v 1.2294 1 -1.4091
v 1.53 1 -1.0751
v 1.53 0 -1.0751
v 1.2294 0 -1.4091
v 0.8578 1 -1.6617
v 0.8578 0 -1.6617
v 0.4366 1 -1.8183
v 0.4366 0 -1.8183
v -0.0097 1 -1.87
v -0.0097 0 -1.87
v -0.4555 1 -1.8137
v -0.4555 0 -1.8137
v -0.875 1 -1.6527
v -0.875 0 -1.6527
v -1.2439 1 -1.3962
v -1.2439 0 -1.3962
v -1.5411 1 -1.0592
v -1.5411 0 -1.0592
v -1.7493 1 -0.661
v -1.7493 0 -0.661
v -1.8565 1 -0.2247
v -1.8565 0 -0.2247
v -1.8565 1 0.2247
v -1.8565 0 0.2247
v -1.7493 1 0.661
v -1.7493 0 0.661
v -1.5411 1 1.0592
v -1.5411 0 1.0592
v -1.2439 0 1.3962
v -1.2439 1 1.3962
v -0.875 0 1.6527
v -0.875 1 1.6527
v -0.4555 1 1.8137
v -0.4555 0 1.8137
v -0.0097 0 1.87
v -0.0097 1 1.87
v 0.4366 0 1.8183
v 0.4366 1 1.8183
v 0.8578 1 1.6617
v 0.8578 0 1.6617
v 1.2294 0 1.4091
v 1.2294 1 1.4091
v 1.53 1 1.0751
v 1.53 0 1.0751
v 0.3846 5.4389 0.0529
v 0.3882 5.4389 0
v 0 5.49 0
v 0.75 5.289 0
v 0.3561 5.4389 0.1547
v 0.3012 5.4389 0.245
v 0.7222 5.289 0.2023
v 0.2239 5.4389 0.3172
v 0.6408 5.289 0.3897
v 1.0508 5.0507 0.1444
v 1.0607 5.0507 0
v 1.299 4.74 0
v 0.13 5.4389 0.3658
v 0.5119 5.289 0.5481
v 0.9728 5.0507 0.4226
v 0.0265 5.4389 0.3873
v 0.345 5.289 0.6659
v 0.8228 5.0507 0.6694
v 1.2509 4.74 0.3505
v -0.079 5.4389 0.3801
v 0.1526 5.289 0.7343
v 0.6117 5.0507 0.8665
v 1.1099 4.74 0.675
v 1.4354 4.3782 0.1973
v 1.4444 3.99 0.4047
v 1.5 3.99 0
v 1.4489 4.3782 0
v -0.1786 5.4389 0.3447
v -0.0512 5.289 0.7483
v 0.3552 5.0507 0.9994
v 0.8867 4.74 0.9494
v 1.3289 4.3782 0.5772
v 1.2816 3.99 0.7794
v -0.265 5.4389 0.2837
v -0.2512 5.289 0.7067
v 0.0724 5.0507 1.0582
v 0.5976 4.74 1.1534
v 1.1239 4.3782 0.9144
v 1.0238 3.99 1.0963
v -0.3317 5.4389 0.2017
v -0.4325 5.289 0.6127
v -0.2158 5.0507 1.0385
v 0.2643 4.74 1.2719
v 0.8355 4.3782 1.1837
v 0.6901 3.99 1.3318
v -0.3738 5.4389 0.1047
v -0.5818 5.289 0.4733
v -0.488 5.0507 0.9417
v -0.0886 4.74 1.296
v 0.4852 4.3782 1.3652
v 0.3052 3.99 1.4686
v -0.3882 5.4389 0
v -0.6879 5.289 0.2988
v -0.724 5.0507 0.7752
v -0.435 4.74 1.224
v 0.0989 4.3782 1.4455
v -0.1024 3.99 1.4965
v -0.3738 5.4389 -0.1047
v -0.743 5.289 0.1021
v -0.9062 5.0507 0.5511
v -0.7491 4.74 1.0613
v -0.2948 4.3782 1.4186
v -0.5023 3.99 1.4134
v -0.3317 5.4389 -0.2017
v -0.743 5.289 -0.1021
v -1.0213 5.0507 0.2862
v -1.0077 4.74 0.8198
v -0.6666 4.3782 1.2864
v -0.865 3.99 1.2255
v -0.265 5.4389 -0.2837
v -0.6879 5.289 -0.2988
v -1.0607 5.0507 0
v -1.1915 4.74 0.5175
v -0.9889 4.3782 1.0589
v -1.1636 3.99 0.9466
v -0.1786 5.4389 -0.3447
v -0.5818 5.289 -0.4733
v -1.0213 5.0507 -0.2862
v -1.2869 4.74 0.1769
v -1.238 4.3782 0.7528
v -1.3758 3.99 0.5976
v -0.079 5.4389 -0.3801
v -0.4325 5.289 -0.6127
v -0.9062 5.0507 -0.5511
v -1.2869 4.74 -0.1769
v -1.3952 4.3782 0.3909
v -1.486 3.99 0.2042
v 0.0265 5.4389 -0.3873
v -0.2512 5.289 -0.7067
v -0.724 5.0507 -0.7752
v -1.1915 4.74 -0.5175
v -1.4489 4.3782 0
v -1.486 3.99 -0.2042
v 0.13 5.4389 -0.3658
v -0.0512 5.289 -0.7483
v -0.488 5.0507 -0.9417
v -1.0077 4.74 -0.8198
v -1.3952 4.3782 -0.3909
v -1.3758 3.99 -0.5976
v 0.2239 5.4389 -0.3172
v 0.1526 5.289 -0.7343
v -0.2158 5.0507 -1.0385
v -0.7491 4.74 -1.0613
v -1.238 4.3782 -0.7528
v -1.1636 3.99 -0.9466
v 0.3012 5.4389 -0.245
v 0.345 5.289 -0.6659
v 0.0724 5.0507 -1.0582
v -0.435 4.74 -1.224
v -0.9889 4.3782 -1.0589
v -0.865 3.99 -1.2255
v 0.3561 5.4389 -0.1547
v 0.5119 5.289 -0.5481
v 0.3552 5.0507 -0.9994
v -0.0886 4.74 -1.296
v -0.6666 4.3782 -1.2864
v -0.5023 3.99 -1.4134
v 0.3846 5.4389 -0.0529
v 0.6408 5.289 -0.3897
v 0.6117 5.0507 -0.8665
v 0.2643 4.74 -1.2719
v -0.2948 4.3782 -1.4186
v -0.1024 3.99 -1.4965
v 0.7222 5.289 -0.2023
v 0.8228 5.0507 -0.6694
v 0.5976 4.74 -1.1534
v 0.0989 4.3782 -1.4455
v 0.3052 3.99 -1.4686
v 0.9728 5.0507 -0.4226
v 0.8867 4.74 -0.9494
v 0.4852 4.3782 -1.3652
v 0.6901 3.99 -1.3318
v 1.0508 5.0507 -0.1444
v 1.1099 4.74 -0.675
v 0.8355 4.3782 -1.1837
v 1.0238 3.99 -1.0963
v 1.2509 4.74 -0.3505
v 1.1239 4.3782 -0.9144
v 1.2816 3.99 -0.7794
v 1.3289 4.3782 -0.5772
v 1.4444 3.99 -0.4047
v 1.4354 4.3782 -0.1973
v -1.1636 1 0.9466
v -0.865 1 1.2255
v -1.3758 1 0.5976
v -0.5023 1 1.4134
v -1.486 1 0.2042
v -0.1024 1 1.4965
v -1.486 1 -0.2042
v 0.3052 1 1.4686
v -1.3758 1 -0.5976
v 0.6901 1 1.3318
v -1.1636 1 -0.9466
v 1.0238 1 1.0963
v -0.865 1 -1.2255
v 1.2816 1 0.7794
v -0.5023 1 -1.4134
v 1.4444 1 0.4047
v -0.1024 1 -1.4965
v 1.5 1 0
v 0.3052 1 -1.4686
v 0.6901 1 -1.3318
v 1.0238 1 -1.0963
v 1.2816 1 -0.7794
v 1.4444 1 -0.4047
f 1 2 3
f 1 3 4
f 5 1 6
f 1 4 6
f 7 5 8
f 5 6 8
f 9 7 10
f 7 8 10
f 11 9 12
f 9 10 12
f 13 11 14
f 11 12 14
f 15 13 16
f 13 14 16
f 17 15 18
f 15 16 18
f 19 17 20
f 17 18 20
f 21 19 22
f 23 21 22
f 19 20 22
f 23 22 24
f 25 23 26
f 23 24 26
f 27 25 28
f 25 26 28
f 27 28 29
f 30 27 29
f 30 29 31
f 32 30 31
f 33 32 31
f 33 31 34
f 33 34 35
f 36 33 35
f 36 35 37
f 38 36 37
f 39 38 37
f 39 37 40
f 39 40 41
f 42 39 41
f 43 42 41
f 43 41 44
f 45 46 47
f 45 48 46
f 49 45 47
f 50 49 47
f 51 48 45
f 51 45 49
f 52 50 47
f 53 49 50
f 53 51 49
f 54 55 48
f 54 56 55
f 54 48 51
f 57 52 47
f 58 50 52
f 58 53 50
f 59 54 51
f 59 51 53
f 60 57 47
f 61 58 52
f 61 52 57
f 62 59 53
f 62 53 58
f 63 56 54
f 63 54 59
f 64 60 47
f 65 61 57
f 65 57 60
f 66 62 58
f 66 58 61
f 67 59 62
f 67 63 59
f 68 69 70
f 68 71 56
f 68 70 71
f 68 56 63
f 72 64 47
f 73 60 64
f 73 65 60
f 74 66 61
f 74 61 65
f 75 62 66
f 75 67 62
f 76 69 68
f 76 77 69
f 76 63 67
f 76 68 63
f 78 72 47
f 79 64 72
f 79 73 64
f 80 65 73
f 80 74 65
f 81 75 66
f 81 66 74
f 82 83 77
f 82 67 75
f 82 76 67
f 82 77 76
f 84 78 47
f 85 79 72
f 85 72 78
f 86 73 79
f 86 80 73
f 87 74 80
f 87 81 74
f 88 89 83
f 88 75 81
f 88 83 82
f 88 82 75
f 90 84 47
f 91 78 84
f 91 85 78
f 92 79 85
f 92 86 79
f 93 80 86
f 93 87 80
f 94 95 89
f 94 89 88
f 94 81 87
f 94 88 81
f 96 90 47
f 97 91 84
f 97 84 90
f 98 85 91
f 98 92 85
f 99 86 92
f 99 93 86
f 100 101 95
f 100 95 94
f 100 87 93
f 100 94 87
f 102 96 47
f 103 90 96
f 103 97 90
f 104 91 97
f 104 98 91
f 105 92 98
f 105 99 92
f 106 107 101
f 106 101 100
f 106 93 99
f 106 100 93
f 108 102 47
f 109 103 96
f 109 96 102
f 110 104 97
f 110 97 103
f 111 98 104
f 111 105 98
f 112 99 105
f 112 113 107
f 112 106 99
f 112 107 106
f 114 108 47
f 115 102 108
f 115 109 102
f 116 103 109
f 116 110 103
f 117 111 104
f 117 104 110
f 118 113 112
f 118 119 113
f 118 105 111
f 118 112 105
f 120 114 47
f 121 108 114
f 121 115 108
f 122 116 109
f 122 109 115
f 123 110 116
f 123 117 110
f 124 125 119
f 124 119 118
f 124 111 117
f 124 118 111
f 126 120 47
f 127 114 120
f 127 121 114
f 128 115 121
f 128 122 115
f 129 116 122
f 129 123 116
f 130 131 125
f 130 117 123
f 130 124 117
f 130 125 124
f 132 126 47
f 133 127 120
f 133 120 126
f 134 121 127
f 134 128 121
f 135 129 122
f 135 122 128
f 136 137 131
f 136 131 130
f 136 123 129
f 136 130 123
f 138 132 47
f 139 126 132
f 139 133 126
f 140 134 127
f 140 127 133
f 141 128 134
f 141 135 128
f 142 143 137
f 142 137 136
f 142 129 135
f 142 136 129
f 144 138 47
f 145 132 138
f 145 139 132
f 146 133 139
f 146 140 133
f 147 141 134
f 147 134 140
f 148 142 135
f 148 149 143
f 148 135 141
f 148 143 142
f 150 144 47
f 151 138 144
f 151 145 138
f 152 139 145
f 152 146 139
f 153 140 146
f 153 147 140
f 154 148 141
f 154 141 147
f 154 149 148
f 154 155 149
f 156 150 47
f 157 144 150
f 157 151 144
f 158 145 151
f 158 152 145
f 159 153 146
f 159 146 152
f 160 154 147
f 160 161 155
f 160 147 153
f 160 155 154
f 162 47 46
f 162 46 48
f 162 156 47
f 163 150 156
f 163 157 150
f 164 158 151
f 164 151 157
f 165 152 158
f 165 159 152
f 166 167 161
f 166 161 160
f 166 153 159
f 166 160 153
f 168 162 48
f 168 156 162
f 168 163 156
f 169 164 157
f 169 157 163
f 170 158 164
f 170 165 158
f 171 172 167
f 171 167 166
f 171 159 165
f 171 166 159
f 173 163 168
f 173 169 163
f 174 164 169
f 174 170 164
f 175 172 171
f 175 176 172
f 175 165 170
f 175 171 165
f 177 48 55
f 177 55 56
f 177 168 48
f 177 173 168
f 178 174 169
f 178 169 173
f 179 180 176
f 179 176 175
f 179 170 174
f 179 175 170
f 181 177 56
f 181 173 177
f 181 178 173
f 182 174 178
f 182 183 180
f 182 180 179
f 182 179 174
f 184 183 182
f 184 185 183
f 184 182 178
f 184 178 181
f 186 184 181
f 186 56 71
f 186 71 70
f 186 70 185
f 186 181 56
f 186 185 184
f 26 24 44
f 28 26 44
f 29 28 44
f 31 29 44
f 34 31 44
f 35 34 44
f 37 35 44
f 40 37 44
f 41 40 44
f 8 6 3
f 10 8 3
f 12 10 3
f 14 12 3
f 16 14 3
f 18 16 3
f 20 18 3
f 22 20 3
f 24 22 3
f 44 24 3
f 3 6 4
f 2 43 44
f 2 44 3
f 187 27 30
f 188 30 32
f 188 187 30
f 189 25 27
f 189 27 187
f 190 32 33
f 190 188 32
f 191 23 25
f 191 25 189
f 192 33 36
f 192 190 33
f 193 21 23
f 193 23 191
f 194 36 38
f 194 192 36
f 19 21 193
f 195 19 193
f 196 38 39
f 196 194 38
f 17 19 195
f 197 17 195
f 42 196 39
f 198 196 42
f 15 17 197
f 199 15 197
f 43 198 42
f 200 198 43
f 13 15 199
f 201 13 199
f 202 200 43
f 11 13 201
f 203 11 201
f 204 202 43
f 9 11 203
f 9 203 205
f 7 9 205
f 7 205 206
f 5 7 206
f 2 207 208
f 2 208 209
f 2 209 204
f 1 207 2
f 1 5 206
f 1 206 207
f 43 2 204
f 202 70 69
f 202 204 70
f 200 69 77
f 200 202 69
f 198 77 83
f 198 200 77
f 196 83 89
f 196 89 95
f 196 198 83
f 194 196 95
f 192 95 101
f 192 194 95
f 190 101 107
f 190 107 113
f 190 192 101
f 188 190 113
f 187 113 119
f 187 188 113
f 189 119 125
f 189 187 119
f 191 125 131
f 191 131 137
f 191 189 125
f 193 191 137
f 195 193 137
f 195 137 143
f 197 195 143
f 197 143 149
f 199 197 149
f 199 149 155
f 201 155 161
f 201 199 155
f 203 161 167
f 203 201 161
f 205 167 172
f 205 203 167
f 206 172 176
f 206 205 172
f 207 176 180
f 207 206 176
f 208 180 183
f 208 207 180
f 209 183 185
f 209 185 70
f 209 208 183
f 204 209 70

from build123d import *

# Parameters (mm, degrees)
SKETCH1_R           = 1.87
BOSS_EXTRUDE1_DEPTH = 1
SKETCH6_W           = 0.679962926
SKETCH6_H           = 3.014349716
CUT_EXTRUDE1_DEPTH  = 1


with BuildPart() as part:
    # Sketch1 → Boss-Extrude1 (new body)
    with BuildSketch(Plane(origin=(0, 0, 0), x_dir=(1, 0, 0), z_dir=(0, 1, 0))):
        Circle(SKETCH1_R)
    extrude(amount=BOSS_EXTRUDE1_DEPTH)

    # Sketch3 → Revolve2 (revolve)
    with BuildSketch(Plane.XY):
        with BuildLine():
            Line((1.5, 3.99), (1.5, 1))
            Line((1.5, 1), (0, 1))
            Line((0, 1), (0, 5.49))
            ThreePointArc((0, 5.49), (1.060660172, 5.050660172), (1.5, 3.99))
        make_face()
    revolve(axis=Axis((0, 5.49, 0), (0, -1, 0)))

    # Sketch6 → Cut-Extrude1 (cut)
    with BuildSketch(Plane(origin=(0, 1, 0), x_dir=(1, 0, 0), z_dir=(0, 1, 0))):
        with Locations((1.87, 0)):
            Rectangle(SKETCH6_W, SKETCH6_H)
    extrude(amount=-CUT_EXTRUDE1_DEPTH, mode=Mode.SUBTRACT)


solid = part.part
